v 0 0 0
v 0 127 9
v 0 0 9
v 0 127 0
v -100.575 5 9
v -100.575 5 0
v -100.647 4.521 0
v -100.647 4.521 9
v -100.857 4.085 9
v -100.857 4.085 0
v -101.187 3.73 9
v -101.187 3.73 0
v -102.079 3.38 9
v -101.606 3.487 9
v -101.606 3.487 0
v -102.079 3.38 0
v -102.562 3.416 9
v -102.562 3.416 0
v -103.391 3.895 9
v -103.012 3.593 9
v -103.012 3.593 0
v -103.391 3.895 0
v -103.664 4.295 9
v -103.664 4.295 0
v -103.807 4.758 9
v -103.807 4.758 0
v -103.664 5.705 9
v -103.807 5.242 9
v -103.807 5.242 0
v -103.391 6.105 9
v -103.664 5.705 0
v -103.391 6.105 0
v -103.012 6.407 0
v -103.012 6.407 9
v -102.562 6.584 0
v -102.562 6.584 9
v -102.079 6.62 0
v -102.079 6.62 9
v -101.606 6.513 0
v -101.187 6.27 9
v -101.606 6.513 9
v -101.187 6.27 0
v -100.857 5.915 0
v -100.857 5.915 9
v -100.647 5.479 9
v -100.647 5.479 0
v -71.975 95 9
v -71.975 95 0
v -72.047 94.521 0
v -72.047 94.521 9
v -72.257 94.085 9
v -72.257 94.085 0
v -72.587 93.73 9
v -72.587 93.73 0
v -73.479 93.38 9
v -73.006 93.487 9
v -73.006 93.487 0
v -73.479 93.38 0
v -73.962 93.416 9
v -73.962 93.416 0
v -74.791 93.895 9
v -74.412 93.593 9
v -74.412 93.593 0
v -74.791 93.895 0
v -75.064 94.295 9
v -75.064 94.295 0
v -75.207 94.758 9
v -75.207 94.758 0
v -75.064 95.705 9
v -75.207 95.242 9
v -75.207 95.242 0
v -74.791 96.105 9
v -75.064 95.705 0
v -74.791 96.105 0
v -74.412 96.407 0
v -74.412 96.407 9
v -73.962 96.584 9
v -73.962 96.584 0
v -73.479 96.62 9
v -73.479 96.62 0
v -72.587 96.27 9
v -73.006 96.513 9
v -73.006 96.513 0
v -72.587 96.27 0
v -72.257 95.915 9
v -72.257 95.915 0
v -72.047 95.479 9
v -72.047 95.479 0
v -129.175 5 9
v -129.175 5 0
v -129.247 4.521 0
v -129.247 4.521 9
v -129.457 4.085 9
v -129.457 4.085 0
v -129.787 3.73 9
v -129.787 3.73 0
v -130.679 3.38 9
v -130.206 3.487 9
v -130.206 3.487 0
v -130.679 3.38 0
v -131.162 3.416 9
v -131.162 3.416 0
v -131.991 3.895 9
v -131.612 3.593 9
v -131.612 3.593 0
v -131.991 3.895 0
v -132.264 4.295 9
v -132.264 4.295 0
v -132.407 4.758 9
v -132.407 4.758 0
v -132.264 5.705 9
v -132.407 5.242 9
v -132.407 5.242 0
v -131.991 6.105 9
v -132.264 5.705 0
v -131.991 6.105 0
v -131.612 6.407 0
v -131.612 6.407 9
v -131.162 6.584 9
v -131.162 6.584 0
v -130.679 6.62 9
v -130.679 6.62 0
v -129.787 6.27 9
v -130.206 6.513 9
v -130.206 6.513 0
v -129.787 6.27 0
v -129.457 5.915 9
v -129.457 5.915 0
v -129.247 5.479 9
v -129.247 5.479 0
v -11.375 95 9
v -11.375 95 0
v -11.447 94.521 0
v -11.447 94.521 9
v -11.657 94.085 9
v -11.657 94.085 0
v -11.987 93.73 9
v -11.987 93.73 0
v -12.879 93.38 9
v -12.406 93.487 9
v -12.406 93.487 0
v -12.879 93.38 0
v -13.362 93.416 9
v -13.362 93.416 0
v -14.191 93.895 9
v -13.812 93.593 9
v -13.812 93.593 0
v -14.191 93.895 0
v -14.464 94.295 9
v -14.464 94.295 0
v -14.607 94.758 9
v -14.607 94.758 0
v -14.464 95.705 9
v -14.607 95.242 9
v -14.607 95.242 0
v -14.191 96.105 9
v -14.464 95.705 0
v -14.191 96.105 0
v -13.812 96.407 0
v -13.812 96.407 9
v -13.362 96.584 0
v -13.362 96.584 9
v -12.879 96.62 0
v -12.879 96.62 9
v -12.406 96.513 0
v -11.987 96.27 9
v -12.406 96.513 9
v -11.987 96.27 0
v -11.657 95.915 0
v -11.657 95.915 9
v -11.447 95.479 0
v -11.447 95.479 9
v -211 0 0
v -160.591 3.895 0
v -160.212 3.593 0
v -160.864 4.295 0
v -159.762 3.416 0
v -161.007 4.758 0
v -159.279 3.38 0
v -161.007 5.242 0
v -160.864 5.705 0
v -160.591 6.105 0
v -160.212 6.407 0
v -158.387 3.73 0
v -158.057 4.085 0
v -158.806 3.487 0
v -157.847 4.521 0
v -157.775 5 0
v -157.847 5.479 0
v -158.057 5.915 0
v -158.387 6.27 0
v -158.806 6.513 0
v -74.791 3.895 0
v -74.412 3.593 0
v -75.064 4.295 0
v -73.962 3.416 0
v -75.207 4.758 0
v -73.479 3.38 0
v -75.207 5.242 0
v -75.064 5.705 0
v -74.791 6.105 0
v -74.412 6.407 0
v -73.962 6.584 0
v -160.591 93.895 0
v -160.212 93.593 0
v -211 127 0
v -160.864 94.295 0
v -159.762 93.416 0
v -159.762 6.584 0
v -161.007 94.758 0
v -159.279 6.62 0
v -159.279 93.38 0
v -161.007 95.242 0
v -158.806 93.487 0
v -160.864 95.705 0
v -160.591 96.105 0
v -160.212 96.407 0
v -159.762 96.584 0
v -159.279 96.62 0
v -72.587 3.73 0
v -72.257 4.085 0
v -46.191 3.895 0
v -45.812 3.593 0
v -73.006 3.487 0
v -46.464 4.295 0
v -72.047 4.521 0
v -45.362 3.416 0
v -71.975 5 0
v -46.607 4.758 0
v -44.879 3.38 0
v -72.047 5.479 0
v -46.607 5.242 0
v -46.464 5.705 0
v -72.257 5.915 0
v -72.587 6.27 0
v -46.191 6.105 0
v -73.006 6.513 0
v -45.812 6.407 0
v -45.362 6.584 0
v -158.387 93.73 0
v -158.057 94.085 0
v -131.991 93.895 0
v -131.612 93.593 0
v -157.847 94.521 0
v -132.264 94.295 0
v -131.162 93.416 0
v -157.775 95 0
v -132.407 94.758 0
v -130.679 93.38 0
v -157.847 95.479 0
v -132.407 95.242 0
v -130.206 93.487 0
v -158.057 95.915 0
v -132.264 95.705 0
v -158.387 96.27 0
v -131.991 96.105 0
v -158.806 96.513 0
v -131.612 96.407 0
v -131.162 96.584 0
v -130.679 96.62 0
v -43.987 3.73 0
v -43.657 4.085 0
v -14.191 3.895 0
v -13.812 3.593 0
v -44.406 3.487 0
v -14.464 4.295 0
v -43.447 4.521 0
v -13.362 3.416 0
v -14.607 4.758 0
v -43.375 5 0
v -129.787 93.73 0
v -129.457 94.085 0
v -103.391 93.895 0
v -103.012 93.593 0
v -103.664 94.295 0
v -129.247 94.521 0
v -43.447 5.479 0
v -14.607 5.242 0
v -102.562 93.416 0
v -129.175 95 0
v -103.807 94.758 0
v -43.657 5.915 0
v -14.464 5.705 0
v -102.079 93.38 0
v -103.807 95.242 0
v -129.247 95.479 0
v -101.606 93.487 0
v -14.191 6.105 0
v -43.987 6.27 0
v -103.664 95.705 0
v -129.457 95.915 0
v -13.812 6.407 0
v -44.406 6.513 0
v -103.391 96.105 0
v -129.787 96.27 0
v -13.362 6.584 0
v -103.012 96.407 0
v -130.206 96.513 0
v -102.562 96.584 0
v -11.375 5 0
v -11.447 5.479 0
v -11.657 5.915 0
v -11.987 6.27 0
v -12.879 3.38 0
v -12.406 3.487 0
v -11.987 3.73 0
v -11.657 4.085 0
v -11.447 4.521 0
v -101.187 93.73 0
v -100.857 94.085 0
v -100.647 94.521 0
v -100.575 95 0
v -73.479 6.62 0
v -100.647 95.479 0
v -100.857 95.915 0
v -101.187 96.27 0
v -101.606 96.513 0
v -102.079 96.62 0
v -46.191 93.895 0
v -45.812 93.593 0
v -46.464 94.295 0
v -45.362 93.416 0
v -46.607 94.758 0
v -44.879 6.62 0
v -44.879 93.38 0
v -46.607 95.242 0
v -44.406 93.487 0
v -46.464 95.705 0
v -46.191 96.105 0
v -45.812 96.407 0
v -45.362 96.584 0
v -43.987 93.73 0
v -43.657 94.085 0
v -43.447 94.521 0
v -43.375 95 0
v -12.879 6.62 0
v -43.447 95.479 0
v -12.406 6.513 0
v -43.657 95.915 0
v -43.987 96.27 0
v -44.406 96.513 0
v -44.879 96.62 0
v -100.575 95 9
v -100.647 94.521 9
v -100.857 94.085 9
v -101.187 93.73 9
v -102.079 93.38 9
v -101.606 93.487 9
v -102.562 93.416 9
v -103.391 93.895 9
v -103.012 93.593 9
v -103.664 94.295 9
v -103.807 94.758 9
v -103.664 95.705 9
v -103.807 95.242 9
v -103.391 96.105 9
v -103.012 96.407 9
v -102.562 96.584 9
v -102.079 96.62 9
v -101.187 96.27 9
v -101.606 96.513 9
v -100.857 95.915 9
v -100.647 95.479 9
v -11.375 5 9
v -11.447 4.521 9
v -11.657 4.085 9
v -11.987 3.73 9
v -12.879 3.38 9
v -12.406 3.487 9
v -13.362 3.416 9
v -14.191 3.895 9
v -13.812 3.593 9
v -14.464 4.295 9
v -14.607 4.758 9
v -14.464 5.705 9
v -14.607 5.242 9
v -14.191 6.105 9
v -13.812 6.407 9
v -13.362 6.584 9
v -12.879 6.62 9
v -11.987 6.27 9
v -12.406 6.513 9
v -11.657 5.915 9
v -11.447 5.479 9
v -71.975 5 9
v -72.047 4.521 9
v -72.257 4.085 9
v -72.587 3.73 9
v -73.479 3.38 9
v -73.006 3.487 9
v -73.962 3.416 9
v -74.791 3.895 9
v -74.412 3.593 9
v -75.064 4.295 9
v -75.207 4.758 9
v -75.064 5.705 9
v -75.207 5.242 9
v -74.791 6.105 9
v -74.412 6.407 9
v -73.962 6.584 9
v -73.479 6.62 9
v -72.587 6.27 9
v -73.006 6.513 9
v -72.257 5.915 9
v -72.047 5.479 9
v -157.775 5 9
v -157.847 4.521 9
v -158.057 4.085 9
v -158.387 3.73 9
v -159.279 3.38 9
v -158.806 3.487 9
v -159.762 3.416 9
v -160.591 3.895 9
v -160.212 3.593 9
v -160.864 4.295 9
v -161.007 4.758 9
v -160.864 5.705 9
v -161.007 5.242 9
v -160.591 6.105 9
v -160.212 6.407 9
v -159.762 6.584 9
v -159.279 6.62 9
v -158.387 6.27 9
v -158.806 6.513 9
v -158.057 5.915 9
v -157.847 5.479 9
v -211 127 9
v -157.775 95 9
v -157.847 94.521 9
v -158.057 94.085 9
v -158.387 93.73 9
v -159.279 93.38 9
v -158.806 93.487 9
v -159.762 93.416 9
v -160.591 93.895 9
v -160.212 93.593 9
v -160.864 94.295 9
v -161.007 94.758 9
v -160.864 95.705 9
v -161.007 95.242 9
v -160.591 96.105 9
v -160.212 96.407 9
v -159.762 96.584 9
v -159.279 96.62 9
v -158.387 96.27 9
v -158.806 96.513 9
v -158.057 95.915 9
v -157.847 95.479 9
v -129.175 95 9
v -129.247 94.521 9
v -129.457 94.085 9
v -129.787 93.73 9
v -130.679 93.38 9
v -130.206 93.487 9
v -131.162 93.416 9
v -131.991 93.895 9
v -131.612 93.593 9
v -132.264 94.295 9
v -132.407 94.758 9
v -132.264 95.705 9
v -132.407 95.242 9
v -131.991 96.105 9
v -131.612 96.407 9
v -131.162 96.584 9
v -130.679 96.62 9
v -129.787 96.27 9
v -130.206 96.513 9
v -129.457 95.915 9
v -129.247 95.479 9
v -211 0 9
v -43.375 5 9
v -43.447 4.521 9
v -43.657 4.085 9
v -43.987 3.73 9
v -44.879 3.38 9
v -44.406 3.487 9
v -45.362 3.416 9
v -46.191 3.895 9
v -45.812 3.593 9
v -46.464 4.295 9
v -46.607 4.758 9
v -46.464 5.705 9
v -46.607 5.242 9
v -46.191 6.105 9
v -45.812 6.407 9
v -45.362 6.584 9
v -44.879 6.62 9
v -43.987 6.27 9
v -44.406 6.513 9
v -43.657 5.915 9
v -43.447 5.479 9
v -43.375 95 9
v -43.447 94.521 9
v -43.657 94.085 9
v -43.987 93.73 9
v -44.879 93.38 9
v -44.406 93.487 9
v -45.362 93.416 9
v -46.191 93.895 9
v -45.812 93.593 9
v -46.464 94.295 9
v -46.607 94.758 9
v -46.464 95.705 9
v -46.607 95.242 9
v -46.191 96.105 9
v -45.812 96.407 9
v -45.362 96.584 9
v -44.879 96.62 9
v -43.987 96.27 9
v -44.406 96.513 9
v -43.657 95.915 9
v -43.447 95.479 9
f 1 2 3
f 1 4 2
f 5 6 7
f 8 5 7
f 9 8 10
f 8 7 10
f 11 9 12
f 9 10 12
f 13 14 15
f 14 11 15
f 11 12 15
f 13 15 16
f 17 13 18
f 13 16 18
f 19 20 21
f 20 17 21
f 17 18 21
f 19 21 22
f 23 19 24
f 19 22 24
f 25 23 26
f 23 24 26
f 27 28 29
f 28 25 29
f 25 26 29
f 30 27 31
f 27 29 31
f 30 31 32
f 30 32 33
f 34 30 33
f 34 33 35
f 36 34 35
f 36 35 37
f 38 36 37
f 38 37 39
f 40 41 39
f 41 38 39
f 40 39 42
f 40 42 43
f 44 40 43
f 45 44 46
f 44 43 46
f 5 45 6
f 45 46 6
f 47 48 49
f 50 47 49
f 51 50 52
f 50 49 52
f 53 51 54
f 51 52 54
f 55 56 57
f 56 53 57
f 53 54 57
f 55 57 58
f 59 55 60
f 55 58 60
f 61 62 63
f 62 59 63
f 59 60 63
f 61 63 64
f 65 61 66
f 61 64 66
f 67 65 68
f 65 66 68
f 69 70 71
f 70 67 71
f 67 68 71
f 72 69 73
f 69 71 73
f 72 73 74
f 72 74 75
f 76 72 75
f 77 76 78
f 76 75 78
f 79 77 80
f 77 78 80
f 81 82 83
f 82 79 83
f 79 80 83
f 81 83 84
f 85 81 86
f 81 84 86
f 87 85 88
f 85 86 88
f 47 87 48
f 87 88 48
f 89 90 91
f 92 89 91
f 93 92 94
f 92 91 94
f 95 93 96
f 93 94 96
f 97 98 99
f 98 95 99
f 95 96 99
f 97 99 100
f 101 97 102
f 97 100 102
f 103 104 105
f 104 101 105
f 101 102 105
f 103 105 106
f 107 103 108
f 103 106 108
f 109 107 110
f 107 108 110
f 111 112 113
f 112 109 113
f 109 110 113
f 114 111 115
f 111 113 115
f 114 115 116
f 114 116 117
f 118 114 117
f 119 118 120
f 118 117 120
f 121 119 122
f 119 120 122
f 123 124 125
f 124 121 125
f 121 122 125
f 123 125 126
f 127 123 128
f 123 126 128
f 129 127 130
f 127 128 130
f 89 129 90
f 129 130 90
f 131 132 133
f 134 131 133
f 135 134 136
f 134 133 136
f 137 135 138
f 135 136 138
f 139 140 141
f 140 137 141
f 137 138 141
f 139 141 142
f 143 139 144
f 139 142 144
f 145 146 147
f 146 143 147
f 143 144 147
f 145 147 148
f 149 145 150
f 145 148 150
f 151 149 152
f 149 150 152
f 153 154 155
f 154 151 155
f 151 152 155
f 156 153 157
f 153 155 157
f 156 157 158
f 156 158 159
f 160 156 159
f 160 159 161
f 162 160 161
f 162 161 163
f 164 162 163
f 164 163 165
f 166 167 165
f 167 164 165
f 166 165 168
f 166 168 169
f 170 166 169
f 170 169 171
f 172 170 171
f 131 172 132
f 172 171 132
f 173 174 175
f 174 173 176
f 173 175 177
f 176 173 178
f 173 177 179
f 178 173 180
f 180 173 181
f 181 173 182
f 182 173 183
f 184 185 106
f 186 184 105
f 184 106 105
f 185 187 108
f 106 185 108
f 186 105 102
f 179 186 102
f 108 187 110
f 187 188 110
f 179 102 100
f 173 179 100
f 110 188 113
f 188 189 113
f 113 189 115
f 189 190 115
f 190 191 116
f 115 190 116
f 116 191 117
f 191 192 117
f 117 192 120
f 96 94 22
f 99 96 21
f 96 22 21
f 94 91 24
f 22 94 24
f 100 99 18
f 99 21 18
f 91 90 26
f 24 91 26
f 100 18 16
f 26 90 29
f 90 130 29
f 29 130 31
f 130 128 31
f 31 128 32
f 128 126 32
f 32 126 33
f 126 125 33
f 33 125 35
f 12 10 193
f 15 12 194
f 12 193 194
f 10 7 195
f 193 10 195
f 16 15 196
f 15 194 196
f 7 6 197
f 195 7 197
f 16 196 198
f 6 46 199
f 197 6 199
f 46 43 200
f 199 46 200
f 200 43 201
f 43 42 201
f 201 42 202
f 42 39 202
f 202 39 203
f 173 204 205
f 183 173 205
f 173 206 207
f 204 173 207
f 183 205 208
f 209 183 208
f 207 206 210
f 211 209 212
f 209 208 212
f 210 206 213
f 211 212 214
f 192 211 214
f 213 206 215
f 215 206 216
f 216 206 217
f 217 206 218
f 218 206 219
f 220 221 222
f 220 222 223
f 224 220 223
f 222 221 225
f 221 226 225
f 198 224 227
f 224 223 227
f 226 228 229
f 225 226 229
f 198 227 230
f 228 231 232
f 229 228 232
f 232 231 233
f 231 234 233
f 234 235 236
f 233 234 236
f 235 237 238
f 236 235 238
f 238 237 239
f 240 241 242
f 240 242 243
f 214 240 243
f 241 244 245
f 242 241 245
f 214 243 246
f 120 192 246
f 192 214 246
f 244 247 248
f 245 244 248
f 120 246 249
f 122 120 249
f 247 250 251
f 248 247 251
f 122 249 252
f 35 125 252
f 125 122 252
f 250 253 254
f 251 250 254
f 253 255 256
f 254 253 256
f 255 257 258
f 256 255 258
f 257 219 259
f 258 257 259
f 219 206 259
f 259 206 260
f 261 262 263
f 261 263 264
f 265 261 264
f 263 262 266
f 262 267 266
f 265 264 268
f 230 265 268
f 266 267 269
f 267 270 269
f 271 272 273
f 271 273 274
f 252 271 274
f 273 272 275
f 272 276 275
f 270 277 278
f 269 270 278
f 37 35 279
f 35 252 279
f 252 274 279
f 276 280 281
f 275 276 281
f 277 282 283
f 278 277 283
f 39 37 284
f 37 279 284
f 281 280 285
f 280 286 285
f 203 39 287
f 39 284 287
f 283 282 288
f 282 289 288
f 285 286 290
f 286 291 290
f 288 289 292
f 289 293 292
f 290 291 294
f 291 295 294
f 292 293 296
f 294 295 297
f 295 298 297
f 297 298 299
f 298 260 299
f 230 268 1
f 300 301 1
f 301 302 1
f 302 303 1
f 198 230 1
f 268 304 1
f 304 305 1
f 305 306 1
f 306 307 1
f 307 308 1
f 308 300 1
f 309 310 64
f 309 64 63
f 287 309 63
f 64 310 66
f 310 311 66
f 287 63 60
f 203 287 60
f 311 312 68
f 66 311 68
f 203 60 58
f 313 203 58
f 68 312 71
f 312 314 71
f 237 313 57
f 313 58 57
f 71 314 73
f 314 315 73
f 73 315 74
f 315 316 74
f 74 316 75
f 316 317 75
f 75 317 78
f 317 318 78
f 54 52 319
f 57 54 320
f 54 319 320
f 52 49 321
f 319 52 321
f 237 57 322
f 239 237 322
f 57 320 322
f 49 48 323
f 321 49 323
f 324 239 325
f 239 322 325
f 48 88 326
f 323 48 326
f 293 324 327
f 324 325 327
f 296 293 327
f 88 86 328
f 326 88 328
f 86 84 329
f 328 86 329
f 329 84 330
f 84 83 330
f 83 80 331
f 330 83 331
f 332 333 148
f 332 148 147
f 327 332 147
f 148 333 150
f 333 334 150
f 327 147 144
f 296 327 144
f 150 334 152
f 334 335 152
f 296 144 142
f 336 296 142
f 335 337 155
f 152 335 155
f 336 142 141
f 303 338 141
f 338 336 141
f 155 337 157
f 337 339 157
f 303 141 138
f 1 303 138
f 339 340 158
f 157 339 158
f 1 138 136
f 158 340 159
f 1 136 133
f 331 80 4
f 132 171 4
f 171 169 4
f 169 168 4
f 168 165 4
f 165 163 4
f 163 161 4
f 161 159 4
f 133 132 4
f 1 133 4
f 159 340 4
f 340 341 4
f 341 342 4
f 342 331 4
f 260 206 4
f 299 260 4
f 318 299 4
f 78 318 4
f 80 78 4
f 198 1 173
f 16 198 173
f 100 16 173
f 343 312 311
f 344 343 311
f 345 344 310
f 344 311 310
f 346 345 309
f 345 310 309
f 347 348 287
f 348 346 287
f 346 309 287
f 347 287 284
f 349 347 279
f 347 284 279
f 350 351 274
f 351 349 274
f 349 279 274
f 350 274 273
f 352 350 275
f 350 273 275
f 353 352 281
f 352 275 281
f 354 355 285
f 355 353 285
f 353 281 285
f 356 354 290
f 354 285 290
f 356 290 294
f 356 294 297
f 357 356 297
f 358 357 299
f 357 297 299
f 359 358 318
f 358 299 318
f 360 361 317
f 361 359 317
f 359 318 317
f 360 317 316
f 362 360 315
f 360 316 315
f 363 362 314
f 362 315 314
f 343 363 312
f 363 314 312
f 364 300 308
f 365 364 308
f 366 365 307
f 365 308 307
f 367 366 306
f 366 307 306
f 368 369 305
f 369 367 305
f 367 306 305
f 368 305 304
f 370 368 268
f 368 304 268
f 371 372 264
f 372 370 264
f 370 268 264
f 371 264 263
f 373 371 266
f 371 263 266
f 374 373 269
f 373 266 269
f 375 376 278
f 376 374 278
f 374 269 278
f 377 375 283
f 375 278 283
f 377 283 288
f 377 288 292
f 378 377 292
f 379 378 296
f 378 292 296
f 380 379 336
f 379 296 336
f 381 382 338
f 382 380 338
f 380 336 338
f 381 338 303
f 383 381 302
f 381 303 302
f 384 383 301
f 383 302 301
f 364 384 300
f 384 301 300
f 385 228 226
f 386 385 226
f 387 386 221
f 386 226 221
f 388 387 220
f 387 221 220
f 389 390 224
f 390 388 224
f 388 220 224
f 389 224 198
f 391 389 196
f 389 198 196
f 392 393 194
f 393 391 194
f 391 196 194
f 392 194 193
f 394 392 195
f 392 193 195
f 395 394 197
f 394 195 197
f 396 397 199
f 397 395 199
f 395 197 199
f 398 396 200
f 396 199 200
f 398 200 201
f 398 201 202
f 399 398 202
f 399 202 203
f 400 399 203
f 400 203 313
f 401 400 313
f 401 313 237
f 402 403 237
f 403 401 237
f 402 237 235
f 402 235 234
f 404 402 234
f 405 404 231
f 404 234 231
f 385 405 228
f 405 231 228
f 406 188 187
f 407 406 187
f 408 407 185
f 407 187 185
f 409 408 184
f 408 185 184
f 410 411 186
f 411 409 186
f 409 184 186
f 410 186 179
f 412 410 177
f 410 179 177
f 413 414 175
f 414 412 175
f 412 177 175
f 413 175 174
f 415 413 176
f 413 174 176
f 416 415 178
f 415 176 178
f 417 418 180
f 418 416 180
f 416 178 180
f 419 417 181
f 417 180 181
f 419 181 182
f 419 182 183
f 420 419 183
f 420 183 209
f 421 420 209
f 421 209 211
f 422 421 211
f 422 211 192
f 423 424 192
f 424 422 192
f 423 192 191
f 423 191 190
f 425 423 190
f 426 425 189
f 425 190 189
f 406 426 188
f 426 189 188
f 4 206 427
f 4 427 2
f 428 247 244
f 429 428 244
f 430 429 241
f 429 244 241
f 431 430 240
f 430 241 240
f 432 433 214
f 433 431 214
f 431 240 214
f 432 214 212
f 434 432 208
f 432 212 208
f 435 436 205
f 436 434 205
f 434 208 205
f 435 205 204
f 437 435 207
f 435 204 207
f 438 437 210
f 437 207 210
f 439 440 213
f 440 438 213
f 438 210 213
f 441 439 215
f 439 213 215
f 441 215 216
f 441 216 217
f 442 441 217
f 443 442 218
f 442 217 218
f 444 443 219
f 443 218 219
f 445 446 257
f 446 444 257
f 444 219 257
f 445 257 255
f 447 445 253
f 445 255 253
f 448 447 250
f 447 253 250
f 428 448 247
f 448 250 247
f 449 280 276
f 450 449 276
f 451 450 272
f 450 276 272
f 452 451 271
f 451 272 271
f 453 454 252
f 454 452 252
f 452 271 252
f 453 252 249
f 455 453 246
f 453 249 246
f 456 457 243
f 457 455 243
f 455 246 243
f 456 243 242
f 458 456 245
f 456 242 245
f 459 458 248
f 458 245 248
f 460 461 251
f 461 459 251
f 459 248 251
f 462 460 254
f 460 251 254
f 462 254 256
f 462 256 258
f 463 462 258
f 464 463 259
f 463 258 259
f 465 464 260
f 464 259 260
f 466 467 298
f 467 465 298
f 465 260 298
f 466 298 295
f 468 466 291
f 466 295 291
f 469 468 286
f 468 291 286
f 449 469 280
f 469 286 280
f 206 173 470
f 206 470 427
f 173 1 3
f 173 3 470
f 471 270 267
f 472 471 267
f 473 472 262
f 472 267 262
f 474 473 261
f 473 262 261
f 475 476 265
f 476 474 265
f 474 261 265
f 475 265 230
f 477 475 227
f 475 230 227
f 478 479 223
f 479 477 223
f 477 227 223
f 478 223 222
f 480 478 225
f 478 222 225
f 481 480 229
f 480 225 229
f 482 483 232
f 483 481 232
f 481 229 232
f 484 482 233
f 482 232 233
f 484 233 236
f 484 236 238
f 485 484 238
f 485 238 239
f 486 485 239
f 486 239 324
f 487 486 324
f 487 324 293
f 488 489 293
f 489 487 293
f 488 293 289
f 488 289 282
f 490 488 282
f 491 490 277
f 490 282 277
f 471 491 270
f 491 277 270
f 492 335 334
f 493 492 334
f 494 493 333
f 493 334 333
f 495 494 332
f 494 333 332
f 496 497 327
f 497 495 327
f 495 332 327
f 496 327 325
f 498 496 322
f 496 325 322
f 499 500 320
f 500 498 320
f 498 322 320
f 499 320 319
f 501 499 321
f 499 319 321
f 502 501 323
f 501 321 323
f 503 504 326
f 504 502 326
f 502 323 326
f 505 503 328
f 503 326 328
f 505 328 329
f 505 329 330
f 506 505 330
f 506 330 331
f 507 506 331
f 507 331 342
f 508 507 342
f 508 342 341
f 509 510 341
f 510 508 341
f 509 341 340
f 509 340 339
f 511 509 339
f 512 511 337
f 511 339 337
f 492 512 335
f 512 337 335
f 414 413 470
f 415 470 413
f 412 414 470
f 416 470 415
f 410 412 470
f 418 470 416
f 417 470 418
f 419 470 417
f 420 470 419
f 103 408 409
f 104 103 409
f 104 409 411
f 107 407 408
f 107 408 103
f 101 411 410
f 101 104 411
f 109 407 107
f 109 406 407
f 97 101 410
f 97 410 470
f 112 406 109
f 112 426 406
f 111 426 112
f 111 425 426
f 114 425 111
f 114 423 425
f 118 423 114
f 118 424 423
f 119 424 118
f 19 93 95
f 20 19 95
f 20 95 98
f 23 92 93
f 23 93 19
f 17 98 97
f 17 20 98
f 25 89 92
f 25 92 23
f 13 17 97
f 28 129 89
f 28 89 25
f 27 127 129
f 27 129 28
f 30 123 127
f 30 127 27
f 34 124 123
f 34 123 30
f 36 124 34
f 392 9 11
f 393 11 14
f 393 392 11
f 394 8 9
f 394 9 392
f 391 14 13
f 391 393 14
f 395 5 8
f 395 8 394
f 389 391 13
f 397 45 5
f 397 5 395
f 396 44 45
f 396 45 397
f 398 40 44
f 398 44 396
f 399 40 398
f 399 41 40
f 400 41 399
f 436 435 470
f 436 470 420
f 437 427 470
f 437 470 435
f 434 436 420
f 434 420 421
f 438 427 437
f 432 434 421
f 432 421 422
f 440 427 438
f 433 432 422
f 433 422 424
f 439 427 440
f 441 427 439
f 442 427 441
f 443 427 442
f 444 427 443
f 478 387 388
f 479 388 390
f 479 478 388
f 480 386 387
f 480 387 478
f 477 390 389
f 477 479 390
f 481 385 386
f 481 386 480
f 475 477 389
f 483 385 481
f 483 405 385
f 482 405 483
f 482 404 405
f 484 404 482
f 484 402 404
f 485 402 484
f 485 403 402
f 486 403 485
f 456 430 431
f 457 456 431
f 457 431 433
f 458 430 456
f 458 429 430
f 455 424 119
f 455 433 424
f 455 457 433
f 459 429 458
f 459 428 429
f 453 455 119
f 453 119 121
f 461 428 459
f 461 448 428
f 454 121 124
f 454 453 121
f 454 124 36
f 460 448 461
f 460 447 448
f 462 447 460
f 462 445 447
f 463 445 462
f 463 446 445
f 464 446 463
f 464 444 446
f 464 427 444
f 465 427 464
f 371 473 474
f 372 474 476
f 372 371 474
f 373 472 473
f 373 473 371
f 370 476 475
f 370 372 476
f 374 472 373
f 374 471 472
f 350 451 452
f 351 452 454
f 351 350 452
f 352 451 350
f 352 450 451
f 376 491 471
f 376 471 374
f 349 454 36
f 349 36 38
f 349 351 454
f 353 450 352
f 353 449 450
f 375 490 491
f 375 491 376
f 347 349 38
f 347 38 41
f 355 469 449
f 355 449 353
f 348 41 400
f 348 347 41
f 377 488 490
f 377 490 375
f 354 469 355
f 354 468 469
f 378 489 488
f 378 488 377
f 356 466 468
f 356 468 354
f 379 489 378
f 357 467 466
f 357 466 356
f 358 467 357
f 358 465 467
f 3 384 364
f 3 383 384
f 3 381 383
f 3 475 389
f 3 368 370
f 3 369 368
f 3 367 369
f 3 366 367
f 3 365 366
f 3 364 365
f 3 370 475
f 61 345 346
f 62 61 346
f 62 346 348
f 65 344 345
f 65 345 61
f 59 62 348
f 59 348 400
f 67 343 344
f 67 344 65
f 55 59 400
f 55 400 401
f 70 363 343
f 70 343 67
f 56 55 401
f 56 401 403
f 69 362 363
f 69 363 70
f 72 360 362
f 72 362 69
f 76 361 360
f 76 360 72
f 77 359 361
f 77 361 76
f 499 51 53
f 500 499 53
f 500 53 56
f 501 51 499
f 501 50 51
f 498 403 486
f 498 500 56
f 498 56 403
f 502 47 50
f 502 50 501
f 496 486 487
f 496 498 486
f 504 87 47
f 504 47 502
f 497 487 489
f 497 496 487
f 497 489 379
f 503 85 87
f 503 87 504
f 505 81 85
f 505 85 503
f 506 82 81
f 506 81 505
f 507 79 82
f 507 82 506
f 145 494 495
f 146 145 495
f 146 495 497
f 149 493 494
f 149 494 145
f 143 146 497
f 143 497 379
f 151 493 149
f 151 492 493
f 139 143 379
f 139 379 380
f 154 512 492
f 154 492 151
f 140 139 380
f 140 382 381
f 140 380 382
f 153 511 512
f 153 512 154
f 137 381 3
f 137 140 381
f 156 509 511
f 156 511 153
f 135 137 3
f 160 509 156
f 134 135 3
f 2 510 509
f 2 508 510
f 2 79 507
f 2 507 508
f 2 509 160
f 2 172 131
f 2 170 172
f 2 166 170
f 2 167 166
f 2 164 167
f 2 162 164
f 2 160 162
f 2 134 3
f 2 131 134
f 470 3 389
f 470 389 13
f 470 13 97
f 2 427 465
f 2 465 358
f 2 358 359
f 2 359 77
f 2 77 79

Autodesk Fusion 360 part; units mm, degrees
sketch "Skizze1" plane through (0, 0, 0) normal (0, 0, 1) x (1, 0, 0)
  line L0 (0, 0) -> (-211, 0)
  line L1 (-211, 0) -> (-211, 127)
  line L2 (-211, 127) -> (0, 127)
  line L3 (0, 127) -> (0, 0)
  circle A0 centre (-13, 5) radius 1.625
  circle A1 centre (-13, 95) radius 1.625
  circle A2 centre (-45, 5) radius 1.625
  circle A3 centre (-45, 95) radius 1.625
  circle A4 centre (-73.6, 5) radius 1.625
  circle A5 centre (-73.6, 5) radius 1.625
  circle A6 centre (-102.2, 5) radius 1.625
  circle A7 centre (-130.8, 5) radius 1.625
  circle A8 centre (-159.4, 5) radius 1.625
  circle A9 centre (-73.6, 95) radius 1.625
  circle A10 centre (-102.2, 95) radius 1.625
  circle A11 centre (-159.4, 95) radius 1.625
  circle A12 centre (-130.8, 95) radius 1.625
  dimension "d1" = 211
  dimension "d2" = 127
  dimension "d3" = 3.25
  dimension "d4" = 13
  dimension "d5" = 5
  dimension "d6" = 3.25
  dimension "d7" = 13
  dimension "d8" = 90
  dimension "d9" = 3.25
  dimension "d10" = 32
  dimension "d11" = 3.25
  dimension "d12" = 3.25
  dimension "d13" = 28.6
  dimension "d14" = 3.25
  dimension "d15" = 3.25
  dimension "d16" = 3.25
  dimension "d17" = 3.25
  dimension "d18" = 3.25
  dimension "d19" = 3.25
  dimension "d20" = 3.25
  dimension "d21" = 3.25
extrude "Extrusion1" add sketch "Skizze1" along normal blind 9
